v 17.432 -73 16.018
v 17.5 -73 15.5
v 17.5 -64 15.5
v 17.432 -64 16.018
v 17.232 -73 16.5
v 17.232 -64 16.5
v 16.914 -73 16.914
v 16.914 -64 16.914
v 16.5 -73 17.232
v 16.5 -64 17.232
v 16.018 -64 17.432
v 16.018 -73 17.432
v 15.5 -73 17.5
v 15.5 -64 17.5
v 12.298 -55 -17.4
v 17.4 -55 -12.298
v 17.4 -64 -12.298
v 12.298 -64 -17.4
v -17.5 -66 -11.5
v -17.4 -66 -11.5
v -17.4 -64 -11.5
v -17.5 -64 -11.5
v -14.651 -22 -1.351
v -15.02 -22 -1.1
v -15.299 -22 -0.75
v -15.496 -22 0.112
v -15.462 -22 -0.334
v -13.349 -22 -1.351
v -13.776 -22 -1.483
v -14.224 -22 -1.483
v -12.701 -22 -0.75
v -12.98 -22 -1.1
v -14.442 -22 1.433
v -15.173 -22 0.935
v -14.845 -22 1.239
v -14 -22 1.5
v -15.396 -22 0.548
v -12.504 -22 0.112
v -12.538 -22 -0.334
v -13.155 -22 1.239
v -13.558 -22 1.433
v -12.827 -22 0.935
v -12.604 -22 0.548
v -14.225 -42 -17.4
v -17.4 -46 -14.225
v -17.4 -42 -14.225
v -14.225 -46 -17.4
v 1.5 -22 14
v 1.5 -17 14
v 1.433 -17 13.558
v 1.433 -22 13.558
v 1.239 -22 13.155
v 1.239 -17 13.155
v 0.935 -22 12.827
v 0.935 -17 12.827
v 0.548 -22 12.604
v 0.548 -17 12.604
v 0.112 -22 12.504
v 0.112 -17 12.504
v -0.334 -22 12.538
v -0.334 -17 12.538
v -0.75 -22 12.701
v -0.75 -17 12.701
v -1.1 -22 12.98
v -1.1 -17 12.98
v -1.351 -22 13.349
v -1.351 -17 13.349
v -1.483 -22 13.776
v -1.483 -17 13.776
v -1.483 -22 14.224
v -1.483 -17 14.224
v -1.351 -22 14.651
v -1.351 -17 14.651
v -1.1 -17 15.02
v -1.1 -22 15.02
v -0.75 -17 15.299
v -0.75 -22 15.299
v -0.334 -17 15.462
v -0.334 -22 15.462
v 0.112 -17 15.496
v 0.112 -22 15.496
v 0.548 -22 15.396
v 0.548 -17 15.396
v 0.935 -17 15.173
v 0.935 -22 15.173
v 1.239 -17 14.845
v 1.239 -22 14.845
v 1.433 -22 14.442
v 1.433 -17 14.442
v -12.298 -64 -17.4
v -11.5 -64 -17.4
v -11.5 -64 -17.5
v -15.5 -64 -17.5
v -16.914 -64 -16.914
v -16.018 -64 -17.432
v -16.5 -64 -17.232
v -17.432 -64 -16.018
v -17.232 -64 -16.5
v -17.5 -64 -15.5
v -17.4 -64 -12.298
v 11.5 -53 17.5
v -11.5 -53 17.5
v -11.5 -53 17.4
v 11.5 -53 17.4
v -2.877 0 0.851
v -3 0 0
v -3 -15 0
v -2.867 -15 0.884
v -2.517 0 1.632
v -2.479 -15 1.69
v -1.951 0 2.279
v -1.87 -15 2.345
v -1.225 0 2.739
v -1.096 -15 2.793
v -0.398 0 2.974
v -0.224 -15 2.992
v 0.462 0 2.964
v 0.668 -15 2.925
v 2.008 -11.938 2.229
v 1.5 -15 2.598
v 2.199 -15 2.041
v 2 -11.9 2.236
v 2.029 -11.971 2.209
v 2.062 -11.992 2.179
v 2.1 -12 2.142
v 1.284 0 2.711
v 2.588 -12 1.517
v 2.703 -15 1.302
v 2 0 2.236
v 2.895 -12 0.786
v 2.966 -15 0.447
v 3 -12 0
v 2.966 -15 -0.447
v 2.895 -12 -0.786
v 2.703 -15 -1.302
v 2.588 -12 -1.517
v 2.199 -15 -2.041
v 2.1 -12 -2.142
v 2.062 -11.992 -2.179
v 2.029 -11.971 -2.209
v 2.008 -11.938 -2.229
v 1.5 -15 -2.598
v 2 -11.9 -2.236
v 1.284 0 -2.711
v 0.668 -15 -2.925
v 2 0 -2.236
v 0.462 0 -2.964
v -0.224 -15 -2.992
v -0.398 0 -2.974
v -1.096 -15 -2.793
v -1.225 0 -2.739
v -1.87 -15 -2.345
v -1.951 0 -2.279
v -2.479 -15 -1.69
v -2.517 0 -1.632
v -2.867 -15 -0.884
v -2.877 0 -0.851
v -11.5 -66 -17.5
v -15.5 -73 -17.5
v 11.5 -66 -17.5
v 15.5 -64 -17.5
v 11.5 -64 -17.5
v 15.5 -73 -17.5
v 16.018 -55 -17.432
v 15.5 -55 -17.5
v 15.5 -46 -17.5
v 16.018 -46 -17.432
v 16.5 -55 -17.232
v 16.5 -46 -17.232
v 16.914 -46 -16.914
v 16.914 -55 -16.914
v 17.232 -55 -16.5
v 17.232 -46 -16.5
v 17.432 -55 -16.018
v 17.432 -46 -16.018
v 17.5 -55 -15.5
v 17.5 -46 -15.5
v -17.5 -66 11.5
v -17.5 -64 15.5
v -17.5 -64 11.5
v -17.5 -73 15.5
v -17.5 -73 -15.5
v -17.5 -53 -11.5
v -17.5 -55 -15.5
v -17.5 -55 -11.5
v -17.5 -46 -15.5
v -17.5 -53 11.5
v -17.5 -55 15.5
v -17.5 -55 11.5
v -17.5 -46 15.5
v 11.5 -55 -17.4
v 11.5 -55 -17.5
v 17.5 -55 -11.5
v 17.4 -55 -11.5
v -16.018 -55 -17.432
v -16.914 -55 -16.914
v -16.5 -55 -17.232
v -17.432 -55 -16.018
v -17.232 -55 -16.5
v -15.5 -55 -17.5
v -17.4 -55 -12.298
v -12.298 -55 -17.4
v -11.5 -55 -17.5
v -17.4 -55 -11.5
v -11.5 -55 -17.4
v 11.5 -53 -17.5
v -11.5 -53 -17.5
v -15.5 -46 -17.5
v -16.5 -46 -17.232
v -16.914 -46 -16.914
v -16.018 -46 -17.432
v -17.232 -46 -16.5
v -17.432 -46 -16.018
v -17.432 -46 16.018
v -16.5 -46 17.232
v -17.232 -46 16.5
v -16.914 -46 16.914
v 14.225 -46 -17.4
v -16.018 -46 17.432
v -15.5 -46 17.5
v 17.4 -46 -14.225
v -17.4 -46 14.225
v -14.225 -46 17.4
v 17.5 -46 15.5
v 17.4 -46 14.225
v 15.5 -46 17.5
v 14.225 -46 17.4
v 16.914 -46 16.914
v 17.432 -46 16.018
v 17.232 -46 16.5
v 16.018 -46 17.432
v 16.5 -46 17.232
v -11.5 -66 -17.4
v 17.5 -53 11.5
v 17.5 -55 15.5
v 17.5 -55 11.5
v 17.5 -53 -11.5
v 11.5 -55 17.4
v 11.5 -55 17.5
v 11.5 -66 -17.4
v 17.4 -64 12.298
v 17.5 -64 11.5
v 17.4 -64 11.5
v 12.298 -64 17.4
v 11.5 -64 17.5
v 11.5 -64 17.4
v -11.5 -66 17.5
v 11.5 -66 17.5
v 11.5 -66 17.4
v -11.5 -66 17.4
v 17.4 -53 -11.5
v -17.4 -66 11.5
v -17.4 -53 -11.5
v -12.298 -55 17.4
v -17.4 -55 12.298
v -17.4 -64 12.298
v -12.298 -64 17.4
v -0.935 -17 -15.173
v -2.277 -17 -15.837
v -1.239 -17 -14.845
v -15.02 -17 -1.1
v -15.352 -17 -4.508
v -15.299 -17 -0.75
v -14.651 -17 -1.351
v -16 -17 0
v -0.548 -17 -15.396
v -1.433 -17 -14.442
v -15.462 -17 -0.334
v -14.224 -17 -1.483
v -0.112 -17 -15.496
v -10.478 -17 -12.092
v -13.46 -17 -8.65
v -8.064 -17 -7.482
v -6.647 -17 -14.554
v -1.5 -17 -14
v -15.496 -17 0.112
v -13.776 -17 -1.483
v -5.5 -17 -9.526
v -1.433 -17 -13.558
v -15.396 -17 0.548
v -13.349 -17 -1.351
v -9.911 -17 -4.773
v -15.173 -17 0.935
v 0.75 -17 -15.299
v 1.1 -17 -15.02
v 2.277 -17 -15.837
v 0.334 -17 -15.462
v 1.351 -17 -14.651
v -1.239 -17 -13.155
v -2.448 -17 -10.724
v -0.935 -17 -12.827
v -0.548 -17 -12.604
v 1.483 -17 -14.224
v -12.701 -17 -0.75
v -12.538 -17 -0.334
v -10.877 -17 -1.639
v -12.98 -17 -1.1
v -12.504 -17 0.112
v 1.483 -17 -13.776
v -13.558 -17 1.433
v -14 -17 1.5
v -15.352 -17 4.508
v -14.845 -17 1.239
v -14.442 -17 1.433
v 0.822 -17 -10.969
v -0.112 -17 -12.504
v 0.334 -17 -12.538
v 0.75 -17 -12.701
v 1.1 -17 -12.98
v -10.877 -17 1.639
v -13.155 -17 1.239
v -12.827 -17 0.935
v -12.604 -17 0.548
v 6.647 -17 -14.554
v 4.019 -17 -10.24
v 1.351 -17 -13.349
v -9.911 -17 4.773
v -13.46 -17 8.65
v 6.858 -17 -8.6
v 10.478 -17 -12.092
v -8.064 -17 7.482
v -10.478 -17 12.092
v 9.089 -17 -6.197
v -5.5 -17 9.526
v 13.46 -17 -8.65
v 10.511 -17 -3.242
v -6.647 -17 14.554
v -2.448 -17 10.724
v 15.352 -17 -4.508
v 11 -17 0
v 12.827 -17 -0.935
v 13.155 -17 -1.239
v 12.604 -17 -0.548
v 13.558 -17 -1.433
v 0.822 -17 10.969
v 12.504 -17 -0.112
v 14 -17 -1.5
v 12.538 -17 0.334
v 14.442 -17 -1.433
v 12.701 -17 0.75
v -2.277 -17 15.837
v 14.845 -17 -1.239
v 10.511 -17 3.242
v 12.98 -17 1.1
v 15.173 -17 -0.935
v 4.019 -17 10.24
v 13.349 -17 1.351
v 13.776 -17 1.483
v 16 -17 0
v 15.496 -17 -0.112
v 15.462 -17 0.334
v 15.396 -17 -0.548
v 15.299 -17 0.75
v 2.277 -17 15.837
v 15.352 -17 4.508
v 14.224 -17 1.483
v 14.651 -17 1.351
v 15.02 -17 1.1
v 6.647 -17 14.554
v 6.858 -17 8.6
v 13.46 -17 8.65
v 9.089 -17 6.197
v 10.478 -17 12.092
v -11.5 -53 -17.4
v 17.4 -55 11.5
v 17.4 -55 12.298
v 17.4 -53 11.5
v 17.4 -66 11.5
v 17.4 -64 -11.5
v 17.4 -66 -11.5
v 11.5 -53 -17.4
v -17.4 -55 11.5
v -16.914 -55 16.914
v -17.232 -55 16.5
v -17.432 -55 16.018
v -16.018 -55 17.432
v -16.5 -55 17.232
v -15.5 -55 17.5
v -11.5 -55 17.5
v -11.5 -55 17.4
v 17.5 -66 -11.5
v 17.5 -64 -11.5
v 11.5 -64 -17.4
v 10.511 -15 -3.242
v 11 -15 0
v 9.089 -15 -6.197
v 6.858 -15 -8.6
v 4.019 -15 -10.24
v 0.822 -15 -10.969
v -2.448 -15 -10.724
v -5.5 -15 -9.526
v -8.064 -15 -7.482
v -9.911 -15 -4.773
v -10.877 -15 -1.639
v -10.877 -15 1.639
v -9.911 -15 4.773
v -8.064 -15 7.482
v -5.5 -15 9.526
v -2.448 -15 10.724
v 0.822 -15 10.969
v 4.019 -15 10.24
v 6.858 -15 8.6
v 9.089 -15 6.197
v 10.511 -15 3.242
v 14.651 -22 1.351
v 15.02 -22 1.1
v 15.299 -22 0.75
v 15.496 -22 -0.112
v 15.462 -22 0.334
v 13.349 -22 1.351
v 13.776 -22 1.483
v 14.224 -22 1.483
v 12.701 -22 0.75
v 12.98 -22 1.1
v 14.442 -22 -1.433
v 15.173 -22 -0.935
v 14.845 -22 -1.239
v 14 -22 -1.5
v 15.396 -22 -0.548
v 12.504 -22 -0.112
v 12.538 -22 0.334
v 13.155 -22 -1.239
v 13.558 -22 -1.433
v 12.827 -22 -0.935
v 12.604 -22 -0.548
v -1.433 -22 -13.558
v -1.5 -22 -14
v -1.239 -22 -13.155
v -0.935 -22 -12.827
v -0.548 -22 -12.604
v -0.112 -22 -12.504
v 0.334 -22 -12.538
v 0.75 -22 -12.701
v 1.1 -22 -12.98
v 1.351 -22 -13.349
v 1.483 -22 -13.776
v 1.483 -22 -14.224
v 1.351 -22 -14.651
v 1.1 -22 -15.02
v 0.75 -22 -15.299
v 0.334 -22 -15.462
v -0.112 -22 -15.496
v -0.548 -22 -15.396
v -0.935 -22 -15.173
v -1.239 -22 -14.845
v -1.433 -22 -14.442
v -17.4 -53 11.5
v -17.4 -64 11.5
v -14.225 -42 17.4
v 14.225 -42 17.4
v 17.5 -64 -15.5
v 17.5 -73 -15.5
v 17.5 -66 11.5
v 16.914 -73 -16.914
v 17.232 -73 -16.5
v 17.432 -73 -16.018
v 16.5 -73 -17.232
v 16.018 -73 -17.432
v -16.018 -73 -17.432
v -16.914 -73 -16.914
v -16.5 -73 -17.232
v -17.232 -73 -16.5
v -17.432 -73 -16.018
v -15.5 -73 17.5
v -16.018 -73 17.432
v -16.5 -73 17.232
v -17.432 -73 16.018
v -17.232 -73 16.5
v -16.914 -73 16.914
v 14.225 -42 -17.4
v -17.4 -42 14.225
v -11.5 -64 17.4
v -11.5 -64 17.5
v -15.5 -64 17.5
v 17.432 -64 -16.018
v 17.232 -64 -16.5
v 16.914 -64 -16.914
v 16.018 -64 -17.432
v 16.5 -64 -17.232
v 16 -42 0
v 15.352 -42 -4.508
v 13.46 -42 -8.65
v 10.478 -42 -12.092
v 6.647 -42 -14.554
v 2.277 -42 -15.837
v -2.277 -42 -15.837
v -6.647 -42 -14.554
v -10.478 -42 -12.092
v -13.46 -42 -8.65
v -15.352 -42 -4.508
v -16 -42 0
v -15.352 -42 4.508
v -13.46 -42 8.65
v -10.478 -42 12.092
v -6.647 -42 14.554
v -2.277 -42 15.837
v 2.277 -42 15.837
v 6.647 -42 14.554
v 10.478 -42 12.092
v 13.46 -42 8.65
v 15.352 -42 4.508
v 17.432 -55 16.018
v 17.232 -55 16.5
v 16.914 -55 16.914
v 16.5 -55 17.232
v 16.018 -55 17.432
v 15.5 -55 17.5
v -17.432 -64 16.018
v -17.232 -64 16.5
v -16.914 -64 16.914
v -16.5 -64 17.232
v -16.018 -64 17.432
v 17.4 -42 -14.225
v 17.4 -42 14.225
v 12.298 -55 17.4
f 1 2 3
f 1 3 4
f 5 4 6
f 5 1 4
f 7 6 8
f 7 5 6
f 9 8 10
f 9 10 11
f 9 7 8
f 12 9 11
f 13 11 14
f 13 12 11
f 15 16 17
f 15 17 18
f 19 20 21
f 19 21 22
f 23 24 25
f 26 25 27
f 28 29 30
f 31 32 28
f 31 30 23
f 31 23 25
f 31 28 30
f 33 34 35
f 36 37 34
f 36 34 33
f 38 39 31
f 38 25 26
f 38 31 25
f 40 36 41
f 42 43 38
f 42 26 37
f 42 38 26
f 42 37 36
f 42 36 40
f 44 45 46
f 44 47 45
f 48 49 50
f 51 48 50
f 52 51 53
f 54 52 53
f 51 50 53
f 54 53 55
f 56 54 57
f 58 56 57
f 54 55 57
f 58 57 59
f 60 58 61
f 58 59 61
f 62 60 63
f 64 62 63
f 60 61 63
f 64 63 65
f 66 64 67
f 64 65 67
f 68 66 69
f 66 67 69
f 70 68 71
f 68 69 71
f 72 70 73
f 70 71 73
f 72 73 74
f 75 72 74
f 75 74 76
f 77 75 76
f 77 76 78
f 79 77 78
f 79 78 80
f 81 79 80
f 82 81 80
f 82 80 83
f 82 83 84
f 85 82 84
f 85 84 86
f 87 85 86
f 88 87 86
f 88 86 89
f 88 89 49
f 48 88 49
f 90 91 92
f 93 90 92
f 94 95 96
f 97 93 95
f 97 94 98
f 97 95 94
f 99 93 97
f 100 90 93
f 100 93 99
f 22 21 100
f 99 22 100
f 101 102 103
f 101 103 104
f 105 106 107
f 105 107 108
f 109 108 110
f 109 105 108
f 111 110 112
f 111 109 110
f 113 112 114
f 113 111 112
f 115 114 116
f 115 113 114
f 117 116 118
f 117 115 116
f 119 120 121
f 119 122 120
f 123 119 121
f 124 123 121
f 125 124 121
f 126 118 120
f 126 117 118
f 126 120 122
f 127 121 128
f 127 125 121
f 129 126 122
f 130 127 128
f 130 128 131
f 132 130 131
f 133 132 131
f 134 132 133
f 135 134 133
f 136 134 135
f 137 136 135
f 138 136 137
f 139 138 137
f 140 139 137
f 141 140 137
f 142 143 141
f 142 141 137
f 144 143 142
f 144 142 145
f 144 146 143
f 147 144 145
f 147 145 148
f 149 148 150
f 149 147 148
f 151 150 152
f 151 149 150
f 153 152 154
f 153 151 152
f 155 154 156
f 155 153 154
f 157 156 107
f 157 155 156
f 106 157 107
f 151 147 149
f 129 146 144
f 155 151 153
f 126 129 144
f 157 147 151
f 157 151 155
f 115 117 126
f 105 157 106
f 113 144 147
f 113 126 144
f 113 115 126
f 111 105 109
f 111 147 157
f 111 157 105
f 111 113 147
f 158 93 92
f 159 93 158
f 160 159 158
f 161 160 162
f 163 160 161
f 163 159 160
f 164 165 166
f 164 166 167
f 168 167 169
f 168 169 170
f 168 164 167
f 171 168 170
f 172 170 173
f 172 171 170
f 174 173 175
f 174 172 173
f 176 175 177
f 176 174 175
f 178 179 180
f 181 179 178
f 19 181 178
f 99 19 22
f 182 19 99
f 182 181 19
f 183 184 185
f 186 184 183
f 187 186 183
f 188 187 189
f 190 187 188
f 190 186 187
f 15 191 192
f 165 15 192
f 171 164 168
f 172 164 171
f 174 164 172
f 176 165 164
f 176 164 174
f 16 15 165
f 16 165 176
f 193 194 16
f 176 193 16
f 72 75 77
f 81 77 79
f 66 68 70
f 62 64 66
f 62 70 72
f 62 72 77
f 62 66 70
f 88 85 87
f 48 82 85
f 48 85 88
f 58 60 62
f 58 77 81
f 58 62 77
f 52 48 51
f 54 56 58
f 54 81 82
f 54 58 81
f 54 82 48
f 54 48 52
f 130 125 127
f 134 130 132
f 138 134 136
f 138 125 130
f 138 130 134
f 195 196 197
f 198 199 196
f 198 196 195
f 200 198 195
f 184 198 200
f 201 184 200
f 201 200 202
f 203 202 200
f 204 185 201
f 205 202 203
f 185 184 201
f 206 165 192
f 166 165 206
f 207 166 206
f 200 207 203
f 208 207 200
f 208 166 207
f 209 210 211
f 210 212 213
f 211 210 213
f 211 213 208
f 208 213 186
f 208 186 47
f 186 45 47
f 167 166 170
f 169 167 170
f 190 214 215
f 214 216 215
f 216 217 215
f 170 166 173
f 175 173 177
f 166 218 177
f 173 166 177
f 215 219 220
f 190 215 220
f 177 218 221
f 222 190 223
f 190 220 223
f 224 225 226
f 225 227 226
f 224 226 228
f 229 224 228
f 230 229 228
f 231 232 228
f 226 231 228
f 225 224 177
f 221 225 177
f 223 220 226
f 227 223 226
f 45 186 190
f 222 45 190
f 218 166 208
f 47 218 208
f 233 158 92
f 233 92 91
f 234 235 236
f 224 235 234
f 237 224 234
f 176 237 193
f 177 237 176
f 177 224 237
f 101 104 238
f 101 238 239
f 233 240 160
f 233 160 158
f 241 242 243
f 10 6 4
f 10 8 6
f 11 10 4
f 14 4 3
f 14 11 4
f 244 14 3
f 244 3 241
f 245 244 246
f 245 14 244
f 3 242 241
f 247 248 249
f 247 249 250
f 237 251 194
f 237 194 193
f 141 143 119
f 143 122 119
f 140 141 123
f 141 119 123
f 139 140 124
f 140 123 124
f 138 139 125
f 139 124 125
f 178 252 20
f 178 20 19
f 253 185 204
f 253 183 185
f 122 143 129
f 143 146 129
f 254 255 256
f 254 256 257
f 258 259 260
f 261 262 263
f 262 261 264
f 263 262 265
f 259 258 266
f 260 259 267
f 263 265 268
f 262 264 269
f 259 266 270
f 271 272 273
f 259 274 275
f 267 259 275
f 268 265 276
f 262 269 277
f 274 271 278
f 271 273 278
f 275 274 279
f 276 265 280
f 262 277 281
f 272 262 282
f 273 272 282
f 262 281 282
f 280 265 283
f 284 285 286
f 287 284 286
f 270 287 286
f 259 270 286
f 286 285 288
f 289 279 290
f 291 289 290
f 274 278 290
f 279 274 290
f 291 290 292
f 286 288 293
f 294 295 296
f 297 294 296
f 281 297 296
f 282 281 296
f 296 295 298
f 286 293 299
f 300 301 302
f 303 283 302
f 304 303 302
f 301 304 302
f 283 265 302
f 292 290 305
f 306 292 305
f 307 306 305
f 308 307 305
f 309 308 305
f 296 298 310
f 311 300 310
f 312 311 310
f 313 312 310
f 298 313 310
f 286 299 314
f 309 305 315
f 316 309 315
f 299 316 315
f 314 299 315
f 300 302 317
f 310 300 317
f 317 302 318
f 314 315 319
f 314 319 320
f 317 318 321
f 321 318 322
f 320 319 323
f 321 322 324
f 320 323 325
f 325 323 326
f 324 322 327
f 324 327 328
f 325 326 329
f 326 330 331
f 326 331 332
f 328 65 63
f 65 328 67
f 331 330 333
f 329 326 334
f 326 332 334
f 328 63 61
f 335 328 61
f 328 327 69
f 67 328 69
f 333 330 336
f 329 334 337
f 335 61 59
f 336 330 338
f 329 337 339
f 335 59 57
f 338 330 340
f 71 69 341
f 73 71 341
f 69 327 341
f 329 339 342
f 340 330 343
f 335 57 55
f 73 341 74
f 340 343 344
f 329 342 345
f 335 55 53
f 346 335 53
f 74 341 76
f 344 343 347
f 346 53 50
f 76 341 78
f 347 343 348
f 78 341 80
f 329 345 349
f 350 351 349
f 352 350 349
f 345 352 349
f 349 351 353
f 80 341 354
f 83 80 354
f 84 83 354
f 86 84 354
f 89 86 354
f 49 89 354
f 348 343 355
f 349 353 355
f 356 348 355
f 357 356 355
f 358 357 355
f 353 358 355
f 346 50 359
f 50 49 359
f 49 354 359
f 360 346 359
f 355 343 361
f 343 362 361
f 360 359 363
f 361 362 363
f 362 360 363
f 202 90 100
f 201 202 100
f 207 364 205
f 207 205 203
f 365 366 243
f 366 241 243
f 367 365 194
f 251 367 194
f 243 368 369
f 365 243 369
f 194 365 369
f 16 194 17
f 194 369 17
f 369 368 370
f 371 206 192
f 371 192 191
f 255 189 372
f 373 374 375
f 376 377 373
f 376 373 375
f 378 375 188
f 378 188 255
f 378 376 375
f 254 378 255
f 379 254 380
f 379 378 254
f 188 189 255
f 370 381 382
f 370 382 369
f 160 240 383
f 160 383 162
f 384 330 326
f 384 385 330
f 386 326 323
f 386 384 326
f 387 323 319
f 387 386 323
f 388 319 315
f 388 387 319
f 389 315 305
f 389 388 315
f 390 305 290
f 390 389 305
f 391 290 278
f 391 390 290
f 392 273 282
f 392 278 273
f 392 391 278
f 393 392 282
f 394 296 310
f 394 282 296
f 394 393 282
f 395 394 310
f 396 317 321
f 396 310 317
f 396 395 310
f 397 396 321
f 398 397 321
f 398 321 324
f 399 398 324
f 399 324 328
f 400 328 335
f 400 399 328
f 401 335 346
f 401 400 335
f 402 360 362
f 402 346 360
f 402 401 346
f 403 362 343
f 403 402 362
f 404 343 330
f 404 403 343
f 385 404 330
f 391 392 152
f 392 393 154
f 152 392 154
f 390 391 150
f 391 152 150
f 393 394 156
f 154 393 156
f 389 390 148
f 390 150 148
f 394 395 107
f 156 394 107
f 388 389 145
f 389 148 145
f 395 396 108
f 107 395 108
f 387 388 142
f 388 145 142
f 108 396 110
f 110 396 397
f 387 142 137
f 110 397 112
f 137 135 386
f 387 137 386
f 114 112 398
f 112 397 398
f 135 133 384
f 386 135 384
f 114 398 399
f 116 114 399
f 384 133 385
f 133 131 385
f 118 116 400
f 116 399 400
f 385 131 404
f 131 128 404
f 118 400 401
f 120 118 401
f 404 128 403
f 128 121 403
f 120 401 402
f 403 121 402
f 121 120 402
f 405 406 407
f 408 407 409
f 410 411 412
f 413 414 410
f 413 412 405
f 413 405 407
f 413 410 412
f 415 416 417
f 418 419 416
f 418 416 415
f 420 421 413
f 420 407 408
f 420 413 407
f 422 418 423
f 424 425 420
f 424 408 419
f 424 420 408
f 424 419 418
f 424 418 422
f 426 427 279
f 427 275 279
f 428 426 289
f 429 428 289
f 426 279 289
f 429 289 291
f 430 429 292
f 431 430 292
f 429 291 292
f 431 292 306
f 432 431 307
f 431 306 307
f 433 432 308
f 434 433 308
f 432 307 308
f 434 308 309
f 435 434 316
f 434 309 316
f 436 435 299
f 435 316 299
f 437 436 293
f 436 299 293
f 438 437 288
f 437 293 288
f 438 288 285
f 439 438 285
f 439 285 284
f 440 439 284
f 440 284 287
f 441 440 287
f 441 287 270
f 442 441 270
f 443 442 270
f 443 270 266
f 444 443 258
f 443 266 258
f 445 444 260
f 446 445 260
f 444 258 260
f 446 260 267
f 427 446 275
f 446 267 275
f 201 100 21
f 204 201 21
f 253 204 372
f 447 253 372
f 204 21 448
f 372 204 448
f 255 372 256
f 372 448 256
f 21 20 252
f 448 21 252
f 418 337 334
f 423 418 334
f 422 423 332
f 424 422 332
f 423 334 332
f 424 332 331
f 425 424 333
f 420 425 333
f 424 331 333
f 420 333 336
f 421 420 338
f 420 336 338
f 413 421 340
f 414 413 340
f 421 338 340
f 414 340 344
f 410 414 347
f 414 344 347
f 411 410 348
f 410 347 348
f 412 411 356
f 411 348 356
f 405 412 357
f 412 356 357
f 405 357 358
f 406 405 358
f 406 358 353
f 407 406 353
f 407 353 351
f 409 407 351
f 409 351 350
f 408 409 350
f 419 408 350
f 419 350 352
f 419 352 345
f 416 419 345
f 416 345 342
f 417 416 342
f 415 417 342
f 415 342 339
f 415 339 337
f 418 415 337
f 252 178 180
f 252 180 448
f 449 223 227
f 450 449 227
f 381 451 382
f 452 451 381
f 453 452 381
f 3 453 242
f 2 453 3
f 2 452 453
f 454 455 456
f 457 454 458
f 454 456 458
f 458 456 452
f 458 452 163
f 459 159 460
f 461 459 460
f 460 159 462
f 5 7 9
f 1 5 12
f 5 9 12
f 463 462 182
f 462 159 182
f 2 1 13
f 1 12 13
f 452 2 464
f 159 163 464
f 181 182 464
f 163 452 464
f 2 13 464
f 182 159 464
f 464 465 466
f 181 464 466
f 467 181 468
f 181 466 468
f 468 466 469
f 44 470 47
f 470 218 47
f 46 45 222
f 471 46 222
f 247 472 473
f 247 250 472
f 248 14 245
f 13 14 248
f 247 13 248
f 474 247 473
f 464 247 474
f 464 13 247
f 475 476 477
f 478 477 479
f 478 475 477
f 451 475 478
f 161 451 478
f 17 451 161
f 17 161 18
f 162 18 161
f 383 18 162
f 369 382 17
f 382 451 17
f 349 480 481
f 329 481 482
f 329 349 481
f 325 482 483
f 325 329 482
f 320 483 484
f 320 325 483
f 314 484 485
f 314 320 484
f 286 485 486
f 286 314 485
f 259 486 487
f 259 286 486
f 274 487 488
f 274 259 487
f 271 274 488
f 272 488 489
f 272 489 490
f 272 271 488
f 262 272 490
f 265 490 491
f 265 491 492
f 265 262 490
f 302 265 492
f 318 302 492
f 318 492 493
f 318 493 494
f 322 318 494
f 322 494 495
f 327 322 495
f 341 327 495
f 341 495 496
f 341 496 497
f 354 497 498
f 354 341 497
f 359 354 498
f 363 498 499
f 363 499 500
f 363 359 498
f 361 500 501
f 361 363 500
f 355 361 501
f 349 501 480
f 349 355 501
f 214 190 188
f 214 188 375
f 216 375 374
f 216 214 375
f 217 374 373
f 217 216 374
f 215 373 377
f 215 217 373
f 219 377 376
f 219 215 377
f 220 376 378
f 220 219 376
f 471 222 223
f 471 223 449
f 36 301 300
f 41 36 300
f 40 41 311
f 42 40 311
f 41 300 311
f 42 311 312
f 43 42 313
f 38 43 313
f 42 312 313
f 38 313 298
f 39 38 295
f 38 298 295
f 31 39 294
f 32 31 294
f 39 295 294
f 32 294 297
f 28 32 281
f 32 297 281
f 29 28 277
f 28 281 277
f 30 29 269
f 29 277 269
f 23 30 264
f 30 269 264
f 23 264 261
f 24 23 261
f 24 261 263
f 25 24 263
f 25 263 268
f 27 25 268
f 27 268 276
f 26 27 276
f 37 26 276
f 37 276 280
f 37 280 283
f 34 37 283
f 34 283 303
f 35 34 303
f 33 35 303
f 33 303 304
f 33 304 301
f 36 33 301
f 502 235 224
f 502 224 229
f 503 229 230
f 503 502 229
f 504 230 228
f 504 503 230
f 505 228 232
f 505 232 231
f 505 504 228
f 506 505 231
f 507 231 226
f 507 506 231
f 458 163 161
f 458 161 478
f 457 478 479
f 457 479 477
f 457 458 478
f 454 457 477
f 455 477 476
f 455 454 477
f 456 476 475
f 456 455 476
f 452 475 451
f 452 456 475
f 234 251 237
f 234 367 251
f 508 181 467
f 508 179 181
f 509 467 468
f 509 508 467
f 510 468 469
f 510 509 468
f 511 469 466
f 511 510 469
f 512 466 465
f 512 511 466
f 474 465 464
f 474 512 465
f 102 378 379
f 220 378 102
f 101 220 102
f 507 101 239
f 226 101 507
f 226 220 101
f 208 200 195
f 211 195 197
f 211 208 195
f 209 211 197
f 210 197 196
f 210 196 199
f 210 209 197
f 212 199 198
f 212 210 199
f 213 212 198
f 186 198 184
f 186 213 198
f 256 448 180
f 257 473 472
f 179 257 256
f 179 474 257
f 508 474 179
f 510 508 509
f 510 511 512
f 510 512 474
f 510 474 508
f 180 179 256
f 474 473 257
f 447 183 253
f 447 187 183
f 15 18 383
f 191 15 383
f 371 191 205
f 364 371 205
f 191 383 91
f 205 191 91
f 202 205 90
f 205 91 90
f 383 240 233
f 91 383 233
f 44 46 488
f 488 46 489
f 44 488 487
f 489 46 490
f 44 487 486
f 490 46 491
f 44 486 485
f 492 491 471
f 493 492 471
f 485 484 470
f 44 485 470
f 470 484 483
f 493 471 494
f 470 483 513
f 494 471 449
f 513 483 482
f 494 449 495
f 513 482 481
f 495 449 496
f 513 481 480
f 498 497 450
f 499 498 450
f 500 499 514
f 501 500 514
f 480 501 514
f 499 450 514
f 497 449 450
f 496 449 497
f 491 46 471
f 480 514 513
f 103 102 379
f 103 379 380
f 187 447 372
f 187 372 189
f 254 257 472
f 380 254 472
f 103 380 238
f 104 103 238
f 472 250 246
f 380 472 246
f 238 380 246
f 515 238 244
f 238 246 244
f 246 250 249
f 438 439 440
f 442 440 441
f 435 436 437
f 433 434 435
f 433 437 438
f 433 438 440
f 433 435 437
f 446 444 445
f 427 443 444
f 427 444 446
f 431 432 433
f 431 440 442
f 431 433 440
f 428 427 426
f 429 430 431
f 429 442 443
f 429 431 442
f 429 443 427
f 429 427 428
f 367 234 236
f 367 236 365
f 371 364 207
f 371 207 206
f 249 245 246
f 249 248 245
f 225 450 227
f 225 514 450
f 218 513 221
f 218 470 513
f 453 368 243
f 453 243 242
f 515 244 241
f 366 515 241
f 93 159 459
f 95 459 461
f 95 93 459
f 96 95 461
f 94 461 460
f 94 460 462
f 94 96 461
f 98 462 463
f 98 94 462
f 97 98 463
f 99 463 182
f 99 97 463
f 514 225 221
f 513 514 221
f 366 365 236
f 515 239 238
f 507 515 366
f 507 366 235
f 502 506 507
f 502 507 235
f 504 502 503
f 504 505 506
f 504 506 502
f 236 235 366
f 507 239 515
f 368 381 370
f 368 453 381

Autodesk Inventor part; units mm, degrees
ref_plane "YZ Plane" through (0, 0, 0) normal (1, 0, 0) x (0, 1, 0)
ref_plane "XZ Plane" through (0, 0, 0) normal (0, 1, 0) x (-1, 0, 0)
ref_plane "XY Plane" through (0, 0, 0) normal (0, 0, 1) x (1, 0, 0)
sketch "Sketch1" plane through (0, 0, 0) normal (0, 1, 0) x (-1, 0, 0)
  circle A0 centre (0, 0) radius 3
  dimension "d0" = 6
extrude "Extrusion1" add sketch "Sketch1" against normal blind 15
sketch "Sketch2" plane through (0, -15, 0) normal (0, -1, 0) x (1, 0, 0)
  circle A0 centre (0, 0) radius 11
  dimension "d3" = 22
extrude "Extrusion2" add sketch "Sketch2" along normal blind 2
sketch "Sketch3" plane through (0, -17, 0) normal (0, -1, 0) x (1, 0, 0)
  circle A0 centre (0, 0) radius 16
  dimension "d6" = 32
extrude "Extrusion3" add sketch "Sketch3" along normal blind 29
sketch "Sketch4" plane through (0, -46, 0) normal (0, -1, 0) x (1, 0, 0)
  line L0 (-17.4, 17.4) -> (17.4, 17.4)
  line L1 (17.4, 17.4) -> (17.4, -17.4)
  line L2 (17.4, -17.4) -> (-17.4, -17.4)
  line L3 (-17.4, -17.4) -> (-17.4, 17.4)
  line L4 (-17.4, 17.4) -> (17.4, -17.4) construction
  line L5 (17.4, 17.4) -> (-17.4, -17.4) construction
  point P0 (0, 0)
  dimension "d9" = 34.8
  dimension "d10" = 34.8
extrude "Extrusion4" add sketch "Sketch4" against normal blind 4
chamfer "Chamfer1" distance 3.175 angle 45 4 edges at (17.4, -44, 17.4) (17.4, -44, -17.4) (-17.4, -44, 17.4) (-17.4, -44, -17.4)
sketch "Sketch5" plane through (0, -46, 0) normal (0, -1, 0) x (1, 0, 0)
  line L0 (17.5, -17.5) -> (-17.5, -17.5)
  line L1 (-17.5, -17.5) -> (-17.5, 17.5)
  line L2 (-17.5, 17.5) -> (17.5, 17.5)
  line L3 (17.5, 17.5) -> (17.5, -17.5)
  line L4 (17.5, -17.5) -> (-17.5, 17.5) construction
  line L5 (-17.5, -17.5) -> (17.5, 17.5) construction
  point P0 (0, 0)
  dimension "d16" = 35
  dimension "d17" = 35
extrude "Extrusion5" add sketch "Sketch5" along normal blind 7
sketch "Sketch6" plane through (0, -53, 0) normal (0, -1, 0) x (1, 0, 0)
  line L0 (-17.5, 17.5) -> (-17.5, -17.5)
  line L1 (-17.5, -17.5) -> (17.5, -17.5)
  line L2 (17.5, -17.5) -> (17.5, 17.5)
  line L3 (17.5, 17.5) -> (-17.5, 17.5)
  line L4 (11.5, 17.5) -> (17.5, 17.5)
  line L5 (17.5, 17.5) -> (17.5, 11.5)
  line L6 (17.5, 11.5) -> (11.5, 11.5)
  line L7 (11.5, 11.5) -> (11.5, 17.5)
  circle A0 centre (0, 0) radius 16
  circle A1 centre (0, 0) radius 16
  line L8 (-17.5, 17.5) -> (-11.5, 17.5)
  line L9 (-17.5, 11.5) -> (-17.5, 17.5)
  line L10 (-11.5, 11.5) -> (-17.5, 11.5)
  line L11 (-11.5, 17.5) -> (-11.5, 11.5)
  line L12 (-17.5, -17.5) -> (-17.5, -11.5)
  line L13 (-11.5, -17.5) -> (-17.5, -17.5)
  line L14 (-11.5, -11.5) -> (-11.5, -17.5)
  line L15 (-17.5, -11.5) -> (-11.5, -11.5)
  line L16 (17.5, -17.5) -> (11.5, -17.5)
  line L17 (17.5, -11.5) -> (17.5, -17.5)
  line L18 (11.5, -11.5) -> (17.5, -11.5)
  line L19 (11.5, -17.5) -> (11.5, -11.5)
  dimension "d43" = 6
  dimension "d44" = 6
  dimension "d47" = 360
extrude "Extrusion6" add sketch "Sketch6" along normal blind 2 contours L3 L11 L10 L0 | L15 L14 L1 L0 | L3 L2 L6 L7 | L19 L18 L2 L1
fillet "Fillet2" radius 2 4 edges at (17.5, -50.5, -17.5) (-17.5, -50.5, -17.5) (-17.5, -50.5, 17.5) (17.5, -50.5, 17.5)
sketch "Sketch7" plane through (0, -53, 0) normal (0, -1, 0) x (1, 0, 0)
  line L0 (-12.2985, -17.4) -> (12.2985, -17.4)
  line L1 (17.4, -12.2985) -> (17.4, 12.2985)
  line L2 (12.2985, 17.4) -> (-12.2985, 17.4)
  line L3 (-17.4, 12.2985) -> (-17.4, -12.2985)
  line L4 (-17.4, -17.4) -> (17.4, 17.4) construction
  line L5 (17.4, -17.4) -> (-17.4, 17.4) construction
  line L6 (-17.4, -12.2985) -> (-12.2985, -17.4)
  line L7 (12.2985, -17.4) -> (17.4, -12.2985)
  line L8 (17.4, 12.2985) -> (12.2985, 17.4)
  line L9 (-12.2985, 17.4) -> (-17.4, 12.2985)
  point P0 (0, 0)
  dimension "d31" = 34.8
  dimension "d32" = 34.8
  dimension "d67" = 42
  dimension "d68" = 42
extrude "Extrusion7" add sketch "Sketch7" along normal blind 6.5
mirror "Mirror1" about plane through (0, -59.5, 0) normal (0, -1, 0) of "Extrusion6", "Extrusion5", "Fillet2", "Extrusion7"
sketch "Sketch8" plane through (0, 0, 0) normal (0, 1, 0) x (1, 0, 0)
  circle A0 centre (0, 0) radius 3
  line L0 (2, 2.2361) -> (2, -2.2361)
  dimension "d50" = 2
extrude "Extrusion8" cut sketch "Sketch8" against normal blind 12 contours A0 L0 picked at (2.1409, -0.5898)
fillet "Fillet3" radius 0.1 1 edges at (2, -12, 0)
sketch "Sketch9" plane through (0, -17, 0) normal (0, 1, 0) x (1, 0, 0)
  circle A0 centre (0, 0) radius 11
  circle A1 centre (0, 0) radius 3
  line L0 (0, 0) -> (0, -14) construction
  circle A2 centre (0, -14) radius 1.5
  dimension "d54" = 14
  dimension "d55" = 3
extrude "Extrusion9" cut sketch "Sketch9" against normal blind 5 contours A2
thread "Thread1"
pattern_circular "Circular Pattern1" count 4 over 360 about axis through (0, -17, 0) along (0, -1, 0) of "Extrusion9"
properties part number "gearedstepper"
